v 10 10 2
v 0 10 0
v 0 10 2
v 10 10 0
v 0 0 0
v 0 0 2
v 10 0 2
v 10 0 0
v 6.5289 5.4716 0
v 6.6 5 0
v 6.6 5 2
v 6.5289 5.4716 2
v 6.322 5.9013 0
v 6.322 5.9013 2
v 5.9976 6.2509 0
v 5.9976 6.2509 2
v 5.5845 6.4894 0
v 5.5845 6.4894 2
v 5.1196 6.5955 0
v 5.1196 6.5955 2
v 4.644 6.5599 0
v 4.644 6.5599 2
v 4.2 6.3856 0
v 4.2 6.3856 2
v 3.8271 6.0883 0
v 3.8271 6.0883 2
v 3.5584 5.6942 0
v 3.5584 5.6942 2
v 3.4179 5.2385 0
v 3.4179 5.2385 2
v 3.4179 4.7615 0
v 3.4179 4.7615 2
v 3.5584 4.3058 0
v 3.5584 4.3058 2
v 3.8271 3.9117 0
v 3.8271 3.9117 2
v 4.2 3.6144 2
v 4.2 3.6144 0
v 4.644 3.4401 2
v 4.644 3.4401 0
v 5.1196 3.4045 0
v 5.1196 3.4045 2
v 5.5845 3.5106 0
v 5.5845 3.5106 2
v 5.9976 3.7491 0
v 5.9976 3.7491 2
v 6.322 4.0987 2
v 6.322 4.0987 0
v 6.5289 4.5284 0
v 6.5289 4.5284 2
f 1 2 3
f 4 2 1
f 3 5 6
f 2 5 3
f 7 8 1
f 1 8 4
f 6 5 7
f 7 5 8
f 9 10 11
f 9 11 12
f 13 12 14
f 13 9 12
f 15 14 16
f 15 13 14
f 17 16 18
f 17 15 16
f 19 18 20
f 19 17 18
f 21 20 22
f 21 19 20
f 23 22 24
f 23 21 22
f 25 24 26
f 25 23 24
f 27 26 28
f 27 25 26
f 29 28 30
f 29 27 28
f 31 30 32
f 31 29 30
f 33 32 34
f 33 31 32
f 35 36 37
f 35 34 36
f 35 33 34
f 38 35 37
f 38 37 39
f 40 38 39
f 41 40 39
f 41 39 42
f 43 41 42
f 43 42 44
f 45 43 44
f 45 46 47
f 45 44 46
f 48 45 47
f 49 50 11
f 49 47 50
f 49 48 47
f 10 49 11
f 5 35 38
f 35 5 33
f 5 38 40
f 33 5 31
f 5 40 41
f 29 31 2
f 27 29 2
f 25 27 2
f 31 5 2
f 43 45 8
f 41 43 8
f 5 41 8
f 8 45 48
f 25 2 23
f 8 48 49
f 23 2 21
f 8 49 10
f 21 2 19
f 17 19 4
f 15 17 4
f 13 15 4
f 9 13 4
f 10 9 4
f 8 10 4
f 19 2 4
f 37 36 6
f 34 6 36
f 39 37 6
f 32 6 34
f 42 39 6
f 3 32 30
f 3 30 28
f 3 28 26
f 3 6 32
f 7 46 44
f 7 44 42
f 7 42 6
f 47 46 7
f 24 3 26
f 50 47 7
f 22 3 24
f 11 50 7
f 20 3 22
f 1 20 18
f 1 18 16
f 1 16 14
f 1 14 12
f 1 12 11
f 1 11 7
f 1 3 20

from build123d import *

# Parameters (mm, degrees)
CYLINDER_R     = 1.6
CYLINDER_DEPTH = 10
BOX_W          = 10
BOX_H          = 10
BOX_DEPTH      = 2


with BuildPart() as cylinder:
    # Cylinder → Cylinder (new body)
    with BuildSketch(Plane(origin=(5, 5, -4), x_dir=(1, 0, 0), z_dir=(0, 0, 1))):
        Circle(CYLINDER_R)
    extrude(amount=CYLINDER_DEPTH)


with BuildPart() as cut:
    # Box → Box (new body)
    with BuildSketch(Plane.XY):
        with Locations((5, 5)):
            Rectangle(BOX_W, BOX_H)
    extrude(amount=BOX_DEPTH)

    # Cut: cut Cylinder
    add(cylinder.part, mode=Mode.SUBTRACT)


solid = cut.part
